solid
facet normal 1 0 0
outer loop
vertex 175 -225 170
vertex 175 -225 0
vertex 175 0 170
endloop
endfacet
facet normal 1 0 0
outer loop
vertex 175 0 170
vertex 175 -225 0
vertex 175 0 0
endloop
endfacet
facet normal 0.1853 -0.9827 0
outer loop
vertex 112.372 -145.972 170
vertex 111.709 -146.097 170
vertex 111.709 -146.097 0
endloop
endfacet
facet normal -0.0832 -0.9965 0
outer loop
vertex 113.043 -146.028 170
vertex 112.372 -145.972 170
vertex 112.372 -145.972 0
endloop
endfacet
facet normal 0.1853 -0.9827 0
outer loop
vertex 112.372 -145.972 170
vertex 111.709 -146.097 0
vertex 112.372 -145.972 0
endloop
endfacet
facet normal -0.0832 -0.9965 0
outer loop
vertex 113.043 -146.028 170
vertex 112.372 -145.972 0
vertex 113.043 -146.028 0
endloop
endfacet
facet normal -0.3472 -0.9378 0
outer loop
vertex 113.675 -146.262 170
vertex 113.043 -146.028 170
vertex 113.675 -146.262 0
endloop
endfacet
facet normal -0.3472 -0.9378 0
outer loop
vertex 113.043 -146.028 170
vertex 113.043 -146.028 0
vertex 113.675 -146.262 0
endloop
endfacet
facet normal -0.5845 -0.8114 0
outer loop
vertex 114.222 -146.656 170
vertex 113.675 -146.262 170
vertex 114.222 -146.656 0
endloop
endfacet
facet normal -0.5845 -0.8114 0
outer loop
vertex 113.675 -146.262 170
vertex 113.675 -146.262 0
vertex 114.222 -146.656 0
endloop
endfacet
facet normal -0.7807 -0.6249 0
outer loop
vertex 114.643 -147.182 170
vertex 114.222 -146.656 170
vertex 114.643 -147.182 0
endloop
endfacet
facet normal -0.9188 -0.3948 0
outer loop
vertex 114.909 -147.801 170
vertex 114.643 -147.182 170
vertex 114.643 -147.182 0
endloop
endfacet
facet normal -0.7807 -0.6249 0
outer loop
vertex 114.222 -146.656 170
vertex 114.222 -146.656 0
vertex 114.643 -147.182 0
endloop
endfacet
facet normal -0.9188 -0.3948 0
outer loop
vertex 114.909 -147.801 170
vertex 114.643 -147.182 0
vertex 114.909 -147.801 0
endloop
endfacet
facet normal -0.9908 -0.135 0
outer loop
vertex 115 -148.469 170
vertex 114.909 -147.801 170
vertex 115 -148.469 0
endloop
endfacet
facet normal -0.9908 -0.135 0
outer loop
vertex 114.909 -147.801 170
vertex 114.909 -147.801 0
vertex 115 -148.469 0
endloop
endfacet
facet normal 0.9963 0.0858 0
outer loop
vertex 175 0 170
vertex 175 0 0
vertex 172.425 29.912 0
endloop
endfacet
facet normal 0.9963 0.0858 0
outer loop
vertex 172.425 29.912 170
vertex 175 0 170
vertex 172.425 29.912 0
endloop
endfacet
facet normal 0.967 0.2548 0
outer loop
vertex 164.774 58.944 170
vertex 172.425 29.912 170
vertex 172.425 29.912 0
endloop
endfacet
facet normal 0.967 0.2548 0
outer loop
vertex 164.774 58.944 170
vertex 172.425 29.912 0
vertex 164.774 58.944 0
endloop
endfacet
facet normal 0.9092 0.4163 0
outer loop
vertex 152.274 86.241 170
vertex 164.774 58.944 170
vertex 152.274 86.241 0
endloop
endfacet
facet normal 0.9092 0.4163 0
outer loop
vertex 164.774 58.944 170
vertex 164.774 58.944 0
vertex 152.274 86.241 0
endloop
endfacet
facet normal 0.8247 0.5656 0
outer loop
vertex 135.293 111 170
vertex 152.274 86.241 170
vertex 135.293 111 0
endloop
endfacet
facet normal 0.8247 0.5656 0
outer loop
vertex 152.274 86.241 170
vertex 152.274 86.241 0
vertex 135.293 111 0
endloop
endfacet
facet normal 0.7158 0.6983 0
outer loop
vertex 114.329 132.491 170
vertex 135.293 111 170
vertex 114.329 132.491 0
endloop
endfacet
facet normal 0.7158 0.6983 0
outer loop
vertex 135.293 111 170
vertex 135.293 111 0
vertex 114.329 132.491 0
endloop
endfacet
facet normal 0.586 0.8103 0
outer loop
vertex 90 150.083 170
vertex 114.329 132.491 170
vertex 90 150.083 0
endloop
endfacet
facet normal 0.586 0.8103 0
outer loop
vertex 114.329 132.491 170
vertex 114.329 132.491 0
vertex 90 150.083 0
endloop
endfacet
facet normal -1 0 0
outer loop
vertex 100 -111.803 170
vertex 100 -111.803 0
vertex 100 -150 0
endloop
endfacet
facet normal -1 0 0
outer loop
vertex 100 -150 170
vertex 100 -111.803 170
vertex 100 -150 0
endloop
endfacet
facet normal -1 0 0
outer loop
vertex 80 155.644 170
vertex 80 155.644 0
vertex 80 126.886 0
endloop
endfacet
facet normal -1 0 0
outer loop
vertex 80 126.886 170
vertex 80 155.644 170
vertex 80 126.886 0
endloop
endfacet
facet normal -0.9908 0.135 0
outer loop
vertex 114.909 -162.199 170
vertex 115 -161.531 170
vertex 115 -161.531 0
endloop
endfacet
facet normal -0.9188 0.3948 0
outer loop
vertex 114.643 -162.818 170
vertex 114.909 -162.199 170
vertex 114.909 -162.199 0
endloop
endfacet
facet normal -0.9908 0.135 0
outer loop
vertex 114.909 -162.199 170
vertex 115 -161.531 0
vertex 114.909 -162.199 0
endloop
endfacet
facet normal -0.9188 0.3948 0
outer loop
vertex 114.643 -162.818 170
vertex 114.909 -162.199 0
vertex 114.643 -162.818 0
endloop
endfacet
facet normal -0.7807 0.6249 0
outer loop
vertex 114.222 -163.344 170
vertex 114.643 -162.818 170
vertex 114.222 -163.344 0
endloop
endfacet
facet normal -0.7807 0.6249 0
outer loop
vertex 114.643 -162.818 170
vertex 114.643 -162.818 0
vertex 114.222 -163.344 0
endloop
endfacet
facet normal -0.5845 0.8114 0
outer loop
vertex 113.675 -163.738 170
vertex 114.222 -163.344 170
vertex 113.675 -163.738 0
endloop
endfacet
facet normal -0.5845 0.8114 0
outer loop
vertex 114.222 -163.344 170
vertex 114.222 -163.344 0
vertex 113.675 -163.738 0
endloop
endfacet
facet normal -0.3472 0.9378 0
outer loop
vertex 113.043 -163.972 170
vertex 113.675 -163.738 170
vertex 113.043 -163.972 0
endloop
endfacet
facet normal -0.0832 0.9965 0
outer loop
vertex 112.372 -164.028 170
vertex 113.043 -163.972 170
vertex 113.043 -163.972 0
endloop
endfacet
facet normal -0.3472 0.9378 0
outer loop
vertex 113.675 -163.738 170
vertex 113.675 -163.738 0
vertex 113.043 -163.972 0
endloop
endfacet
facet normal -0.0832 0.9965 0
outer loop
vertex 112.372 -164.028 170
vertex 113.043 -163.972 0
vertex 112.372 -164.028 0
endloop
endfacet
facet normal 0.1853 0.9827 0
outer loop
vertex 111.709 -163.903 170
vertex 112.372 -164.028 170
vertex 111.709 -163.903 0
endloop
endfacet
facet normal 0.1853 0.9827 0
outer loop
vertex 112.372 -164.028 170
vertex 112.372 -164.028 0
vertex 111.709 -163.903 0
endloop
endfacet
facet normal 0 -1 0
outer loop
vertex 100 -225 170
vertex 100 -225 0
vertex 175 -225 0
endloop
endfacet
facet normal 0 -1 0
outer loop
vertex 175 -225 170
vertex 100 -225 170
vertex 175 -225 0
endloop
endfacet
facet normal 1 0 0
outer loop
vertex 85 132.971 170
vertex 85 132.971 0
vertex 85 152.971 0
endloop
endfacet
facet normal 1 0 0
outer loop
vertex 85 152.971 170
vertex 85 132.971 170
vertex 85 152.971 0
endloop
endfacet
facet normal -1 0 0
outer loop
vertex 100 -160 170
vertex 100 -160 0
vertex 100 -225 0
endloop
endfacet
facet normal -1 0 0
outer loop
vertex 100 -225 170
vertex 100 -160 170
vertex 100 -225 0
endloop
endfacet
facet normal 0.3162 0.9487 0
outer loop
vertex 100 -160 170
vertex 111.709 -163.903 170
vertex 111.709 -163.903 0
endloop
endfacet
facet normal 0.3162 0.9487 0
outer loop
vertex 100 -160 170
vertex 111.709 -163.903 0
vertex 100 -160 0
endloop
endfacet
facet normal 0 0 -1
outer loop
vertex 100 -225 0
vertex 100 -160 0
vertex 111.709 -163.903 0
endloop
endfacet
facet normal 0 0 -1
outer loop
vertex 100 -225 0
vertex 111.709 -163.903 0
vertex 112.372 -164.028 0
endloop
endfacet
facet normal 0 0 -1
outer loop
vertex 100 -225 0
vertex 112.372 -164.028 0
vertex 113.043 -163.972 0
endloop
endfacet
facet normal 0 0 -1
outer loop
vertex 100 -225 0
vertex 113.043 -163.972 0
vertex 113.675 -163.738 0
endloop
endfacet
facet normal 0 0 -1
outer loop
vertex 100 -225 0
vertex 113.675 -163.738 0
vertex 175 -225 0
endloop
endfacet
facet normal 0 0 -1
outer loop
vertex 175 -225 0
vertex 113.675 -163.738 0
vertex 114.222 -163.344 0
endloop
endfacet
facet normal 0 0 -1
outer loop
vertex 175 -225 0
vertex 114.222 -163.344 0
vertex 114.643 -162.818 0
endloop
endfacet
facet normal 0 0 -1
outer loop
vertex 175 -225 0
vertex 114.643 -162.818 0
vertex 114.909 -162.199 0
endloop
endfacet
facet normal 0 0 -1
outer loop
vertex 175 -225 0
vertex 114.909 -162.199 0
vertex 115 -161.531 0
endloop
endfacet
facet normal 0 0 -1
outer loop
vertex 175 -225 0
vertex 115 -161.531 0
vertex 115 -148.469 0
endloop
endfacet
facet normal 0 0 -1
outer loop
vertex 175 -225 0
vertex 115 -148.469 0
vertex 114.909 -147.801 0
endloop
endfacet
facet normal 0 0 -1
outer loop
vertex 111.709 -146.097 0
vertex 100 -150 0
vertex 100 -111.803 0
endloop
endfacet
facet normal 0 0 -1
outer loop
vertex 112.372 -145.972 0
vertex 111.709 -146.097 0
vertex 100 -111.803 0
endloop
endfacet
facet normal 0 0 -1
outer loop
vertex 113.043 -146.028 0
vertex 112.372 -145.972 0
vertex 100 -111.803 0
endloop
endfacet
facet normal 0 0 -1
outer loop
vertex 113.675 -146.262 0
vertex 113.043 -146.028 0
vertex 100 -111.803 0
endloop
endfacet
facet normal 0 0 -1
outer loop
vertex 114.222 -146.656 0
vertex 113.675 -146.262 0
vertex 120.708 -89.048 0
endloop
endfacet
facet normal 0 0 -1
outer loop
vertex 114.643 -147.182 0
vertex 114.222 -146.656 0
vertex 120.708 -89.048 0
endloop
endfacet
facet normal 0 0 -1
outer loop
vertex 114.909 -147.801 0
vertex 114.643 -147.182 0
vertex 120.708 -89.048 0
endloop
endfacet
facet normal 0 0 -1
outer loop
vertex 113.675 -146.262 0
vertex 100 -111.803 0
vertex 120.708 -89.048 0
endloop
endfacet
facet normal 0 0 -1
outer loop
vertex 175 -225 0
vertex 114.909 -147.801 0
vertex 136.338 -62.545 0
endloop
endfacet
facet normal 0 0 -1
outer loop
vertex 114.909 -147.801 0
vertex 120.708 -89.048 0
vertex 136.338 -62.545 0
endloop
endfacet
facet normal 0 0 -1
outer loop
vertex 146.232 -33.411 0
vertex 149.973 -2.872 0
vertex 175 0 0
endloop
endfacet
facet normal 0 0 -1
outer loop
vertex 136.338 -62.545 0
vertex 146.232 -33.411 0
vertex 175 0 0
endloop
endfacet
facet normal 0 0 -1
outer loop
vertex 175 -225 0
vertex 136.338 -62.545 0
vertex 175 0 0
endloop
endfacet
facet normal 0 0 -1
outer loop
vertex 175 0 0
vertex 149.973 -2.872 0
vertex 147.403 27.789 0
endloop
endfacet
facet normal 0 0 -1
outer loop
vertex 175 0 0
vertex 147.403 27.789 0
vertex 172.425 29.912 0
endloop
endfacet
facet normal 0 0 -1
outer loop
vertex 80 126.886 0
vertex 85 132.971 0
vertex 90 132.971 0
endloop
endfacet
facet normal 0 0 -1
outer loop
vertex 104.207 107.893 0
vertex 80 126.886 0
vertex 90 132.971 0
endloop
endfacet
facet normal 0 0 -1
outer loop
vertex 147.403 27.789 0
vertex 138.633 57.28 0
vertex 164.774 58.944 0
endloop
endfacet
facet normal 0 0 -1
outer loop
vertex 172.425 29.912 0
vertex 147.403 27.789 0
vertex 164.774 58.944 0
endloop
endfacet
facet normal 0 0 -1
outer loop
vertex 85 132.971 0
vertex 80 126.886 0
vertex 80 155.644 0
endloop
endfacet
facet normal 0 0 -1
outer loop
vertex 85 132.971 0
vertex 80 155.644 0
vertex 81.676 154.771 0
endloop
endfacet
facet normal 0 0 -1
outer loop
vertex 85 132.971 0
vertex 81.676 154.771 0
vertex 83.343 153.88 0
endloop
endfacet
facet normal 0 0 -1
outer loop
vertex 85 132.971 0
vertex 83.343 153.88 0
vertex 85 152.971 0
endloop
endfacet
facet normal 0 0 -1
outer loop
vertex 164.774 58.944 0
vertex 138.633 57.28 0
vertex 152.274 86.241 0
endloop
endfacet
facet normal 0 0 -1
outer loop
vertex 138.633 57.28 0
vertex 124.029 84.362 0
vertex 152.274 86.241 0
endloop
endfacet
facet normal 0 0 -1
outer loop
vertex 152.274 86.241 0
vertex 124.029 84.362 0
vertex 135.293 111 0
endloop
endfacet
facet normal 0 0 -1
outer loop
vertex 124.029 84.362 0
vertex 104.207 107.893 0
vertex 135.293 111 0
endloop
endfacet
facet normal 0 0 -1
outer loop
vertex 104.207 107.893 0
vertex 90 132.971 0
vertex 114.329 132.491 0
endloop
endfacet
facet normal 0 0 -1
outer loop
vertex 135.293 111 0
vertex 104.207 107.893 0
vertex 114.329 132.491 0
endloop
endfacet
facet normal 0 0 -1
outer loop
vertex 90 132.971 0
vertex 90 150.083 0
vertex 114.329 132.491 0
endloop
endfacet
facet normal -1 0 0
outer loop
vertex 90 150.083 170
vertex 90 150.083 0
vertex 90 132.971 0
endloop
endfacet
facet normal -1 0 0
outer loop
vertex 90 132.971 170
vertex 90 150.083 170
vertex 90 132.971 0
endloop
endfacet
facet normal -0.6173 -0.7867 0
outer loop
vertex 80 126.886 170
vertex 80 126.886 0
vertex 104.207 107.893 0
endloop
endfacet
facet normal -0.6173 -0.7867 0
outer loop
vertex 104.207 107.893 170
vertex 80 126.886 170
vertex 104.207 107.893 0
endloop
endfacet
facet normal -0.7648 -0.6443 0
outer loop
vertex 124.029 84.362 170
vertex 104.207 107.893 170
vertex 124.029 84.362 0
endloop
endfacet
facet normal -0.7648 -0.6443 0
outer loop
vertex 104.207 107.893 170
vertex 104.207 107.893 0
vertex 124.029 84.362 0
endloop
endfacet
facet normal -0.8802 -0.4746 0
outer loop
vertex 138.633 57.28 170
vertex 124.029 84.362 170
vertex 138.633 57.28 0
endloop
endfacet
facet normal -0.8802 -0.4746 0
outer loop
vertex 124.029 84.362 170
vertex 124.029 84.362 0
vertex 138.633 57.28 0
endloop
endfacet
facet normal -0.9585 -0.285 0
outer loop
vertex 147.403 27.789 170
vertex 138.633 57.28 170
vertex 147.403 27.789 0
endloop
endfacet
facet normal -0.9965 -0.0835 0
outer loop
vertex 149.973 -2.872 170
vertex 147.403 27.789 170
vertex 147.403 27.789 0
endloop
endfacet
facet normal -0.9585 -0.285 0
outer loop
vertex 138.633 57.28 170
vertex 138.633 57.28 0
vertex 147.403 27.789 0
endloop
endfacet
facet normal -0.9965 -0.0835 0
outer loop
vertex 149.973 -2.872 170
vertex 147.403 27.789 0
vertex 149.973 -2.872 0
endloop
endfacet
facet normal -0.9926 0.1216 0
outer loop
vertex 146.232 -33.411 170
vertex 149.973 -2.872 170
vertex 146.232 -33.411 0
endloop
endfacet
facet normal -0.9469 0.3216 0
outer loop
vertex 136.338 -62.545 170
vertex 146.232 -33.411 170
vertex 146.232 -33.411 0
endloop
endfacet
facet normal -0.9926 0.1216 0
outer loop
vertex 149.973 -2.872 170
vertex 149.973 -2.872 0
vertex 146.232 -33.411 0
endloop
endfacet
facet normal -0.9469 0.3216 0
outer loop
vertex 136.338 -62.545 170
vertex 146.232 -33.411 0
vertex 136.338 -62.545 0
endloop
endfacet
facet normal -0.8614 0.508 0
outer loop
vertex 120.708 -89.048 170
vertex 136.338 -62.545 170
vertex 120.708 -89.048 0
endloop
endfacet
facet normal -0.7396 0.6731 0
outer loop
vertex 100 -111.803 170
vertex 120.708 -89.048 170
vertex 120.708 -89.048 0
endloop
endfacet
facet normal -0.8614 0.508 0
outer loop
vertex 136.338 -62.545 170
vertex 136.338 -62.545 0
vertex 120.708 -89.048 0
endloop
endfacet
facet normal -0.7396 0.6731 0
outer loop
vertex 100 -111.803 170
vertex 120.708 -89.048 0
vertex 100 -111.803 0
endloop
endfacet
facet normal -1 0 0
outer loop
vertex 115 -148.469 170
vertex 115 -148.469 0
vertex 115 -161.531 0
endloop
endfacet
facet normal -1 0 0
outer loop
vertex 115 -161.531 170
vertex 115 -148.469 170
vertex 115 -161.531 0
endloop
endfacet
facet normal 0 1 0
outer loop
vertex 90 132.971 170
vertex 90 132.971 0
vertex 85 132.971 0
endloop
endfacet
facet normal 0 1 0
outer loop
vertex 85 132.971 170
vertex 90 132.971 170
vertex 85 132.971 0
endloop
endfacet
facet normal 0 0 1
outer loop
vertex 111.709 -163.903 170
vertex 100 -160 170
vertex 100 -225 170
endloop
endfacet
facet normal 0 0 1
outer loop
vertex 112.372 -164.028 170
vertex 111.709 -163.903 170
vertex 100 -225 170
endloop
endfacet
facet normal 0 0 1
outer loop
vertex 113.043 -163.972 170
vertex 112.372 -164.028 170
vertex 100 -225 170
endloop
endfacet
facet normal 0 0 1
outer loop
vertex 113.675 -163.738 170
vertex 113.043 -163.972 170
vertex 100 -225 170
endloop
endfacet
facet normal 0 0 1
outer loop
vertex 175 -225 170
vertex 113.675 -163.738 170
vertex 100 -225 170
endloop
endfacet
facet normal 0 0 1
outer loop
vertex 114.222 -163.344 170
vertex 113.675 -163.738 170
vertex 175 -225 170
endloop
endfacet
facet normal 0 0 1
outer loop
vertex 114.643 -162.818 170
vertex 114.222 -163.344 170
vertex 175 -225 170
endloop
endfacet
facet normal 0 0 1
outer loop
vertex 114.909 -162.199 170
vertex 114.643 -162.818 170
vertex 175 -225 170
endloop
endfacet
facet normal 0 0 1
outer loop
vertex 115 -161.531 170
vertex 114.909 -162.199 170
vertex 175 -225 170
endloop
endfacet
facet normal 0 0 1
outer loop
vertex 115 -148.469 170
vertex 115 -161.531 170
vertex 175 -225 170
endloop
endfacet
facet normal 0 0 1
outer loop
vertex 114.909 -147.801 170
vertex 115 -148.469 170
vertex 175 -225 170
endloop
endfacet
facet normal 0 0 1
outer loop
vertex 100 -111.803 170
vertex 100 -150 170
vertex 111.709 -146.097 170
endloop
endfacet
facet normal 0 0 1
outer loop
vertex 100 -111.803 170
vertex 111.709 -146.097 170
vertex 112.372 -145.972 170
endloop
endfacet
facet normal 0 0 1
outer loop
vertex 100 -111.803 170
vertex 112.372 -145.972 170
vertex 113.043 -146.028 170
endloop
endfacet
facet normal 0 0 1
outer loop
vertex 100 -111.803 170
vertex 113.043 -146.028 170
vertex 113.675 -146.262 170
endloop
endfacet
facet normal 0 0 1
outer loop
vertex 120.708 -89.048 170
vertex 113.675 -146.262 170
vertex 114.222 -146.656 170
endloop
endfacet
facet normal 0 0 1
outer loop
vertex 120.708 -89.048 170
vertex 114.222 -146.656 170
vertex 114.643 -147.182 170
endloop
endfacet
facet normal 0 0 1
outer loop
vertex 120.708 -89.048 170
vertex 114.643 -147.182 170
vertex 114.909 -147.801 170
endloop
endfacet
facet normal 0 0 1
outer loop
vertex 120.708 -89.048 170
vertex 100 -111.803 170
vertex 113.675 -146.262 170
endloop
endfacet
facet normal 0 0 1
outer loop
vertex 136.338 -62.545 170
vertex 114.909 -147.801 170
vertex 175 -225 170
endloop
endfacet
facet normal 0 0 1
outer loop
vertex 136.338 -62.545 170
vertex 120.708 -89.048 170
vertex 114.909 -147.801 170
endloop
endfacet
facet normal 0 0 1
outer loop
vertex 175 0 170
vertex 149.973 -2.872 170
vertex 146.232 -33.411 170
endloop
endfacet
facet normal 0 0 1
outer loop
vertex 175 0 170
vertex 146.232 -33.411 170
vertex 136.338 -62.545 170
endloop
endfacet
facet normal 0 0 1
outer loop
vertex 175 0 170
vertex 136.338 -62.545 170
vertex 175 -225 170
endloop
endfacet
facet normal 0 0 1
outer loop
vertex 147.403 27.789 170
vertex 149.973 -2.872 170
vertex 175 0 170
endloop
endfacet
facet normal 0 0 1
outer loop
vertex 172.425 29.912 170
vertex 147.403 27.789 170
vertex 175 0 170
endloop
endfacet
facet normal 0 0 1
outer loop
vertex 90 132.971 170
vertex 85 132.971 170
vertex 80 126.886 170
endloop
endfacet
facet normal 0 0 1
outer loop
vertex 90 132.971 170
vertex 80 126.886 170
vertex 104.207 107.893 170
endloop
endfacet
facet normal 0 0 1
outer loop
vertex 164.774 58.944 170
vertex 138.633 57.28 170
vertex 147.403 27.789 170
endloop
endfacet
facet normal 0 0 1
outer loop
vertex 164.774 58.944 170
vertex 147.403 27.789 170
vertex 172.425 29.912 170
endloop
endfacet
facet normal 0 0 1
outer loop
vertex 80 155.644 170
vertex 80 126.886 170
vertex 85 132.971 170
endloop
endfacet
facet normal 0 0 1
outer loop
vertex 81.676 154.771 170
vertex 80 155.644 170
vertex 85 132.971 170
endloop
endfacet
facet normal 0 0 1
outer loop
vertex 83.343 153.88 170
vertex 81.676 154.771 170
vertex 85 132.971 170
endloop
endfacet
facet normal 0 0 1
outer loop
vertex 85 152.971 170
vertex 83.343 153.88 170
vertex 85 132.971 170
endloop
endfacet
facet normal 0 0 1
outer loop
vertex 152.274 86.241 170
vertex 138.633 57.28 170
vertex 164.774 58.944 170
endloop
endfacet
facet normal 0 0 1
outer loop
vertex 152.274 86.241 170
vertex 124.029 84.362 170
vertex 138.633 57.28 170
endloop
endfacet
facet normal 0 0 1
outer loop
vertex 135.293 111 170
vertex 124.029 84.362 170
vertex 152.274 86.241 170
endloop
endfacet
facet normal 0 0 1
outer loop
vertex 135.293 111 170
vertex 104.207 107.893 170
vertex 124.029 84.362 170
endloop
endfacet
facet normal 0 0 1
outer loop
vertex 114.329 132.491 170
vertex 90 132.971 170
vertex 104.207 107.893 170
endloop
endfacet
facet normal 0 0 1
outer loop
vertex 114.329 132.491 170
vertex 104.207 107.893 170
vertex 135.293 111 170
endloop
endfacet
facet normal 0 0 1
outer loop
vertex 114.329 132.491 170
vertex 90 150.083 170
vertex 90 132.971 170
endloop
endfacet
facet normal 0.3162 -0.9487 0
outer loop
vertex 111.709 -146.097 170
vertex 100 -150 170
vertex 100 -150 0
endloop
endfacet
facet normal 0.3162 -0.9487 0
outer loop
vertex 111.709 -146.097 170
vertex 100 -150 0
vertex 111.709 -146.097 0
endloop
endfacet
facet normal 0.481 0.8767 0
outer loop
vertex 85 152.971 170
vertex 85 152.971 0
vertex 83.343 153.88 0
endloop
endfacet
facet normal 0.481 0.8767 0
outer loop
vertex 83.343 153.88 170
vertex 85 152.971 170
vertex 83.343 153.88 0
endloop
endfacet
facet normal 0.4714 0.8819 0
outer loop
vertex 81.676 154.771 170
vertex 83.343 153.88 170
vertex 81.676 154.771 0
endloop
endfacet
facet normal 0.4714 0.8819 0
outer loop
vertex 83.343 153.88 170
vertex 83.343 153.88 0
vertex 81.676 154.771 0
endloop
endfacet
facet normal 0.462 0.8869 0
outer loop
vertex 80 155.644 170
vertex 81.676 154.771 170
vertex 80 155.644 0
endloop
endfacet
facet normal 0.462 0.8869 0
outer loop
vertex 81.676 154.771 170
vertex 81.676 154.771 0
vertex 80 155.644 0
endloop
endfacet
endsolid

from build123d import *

# Parameters (mm, degrees)
INNER_RING_RIGHT_SIDE_DEPTH = 170


with BuildPart() as part:
    # Sketch2 → Inner Ring - Right Side (new body)
    with BuildSketch(Plane.XY):
        with BuildLine():
            Line((100, -111.803398875), (100, -150))
            Line((100, -150), (111.709430585, -146.096856472))
            ThreePointArc((111.709430585, -146.096856472), (113.961775712, -146.440459254), (115, -148.468564717))
            Line((115, -148.468564717), (115, -161.531435283))
            ThreePointArc((115, -161.531435283), (113.961775712, -163.559540746), (111.709430585, -163.903143528))
            Line((111.709430585, -163.903143528), (100, -160))
            Line((100, -160), (100, -225))
            Line((100, -225), (175, -225))
            Line((175, -225), (175, 0))
            ThreePointArc((175, 0), (152.274423328, 86.240941553), (90, 150.083310198))
            Line((90, 150.083310198), (90, 132.970585408))
            Line((90, 132.970585408), (85, 132.970585408))
            Line((85, 132.970585408), (85, 152.970585408))
            ThreePointArc((85, 152.970585408), (82.510826874, 154.327455265), (80, 155.643824163))
            Line((80, 155.643824163), (80, 126.885775404))
            ThreePointArc((80, 126.885775404), (149.476186998, 12.524756303), (100, -111.803398875))
        make_face()
    extrude(amount=INNER_RING_RIGHT_SIDE_DEPTH)


solid = part.part
